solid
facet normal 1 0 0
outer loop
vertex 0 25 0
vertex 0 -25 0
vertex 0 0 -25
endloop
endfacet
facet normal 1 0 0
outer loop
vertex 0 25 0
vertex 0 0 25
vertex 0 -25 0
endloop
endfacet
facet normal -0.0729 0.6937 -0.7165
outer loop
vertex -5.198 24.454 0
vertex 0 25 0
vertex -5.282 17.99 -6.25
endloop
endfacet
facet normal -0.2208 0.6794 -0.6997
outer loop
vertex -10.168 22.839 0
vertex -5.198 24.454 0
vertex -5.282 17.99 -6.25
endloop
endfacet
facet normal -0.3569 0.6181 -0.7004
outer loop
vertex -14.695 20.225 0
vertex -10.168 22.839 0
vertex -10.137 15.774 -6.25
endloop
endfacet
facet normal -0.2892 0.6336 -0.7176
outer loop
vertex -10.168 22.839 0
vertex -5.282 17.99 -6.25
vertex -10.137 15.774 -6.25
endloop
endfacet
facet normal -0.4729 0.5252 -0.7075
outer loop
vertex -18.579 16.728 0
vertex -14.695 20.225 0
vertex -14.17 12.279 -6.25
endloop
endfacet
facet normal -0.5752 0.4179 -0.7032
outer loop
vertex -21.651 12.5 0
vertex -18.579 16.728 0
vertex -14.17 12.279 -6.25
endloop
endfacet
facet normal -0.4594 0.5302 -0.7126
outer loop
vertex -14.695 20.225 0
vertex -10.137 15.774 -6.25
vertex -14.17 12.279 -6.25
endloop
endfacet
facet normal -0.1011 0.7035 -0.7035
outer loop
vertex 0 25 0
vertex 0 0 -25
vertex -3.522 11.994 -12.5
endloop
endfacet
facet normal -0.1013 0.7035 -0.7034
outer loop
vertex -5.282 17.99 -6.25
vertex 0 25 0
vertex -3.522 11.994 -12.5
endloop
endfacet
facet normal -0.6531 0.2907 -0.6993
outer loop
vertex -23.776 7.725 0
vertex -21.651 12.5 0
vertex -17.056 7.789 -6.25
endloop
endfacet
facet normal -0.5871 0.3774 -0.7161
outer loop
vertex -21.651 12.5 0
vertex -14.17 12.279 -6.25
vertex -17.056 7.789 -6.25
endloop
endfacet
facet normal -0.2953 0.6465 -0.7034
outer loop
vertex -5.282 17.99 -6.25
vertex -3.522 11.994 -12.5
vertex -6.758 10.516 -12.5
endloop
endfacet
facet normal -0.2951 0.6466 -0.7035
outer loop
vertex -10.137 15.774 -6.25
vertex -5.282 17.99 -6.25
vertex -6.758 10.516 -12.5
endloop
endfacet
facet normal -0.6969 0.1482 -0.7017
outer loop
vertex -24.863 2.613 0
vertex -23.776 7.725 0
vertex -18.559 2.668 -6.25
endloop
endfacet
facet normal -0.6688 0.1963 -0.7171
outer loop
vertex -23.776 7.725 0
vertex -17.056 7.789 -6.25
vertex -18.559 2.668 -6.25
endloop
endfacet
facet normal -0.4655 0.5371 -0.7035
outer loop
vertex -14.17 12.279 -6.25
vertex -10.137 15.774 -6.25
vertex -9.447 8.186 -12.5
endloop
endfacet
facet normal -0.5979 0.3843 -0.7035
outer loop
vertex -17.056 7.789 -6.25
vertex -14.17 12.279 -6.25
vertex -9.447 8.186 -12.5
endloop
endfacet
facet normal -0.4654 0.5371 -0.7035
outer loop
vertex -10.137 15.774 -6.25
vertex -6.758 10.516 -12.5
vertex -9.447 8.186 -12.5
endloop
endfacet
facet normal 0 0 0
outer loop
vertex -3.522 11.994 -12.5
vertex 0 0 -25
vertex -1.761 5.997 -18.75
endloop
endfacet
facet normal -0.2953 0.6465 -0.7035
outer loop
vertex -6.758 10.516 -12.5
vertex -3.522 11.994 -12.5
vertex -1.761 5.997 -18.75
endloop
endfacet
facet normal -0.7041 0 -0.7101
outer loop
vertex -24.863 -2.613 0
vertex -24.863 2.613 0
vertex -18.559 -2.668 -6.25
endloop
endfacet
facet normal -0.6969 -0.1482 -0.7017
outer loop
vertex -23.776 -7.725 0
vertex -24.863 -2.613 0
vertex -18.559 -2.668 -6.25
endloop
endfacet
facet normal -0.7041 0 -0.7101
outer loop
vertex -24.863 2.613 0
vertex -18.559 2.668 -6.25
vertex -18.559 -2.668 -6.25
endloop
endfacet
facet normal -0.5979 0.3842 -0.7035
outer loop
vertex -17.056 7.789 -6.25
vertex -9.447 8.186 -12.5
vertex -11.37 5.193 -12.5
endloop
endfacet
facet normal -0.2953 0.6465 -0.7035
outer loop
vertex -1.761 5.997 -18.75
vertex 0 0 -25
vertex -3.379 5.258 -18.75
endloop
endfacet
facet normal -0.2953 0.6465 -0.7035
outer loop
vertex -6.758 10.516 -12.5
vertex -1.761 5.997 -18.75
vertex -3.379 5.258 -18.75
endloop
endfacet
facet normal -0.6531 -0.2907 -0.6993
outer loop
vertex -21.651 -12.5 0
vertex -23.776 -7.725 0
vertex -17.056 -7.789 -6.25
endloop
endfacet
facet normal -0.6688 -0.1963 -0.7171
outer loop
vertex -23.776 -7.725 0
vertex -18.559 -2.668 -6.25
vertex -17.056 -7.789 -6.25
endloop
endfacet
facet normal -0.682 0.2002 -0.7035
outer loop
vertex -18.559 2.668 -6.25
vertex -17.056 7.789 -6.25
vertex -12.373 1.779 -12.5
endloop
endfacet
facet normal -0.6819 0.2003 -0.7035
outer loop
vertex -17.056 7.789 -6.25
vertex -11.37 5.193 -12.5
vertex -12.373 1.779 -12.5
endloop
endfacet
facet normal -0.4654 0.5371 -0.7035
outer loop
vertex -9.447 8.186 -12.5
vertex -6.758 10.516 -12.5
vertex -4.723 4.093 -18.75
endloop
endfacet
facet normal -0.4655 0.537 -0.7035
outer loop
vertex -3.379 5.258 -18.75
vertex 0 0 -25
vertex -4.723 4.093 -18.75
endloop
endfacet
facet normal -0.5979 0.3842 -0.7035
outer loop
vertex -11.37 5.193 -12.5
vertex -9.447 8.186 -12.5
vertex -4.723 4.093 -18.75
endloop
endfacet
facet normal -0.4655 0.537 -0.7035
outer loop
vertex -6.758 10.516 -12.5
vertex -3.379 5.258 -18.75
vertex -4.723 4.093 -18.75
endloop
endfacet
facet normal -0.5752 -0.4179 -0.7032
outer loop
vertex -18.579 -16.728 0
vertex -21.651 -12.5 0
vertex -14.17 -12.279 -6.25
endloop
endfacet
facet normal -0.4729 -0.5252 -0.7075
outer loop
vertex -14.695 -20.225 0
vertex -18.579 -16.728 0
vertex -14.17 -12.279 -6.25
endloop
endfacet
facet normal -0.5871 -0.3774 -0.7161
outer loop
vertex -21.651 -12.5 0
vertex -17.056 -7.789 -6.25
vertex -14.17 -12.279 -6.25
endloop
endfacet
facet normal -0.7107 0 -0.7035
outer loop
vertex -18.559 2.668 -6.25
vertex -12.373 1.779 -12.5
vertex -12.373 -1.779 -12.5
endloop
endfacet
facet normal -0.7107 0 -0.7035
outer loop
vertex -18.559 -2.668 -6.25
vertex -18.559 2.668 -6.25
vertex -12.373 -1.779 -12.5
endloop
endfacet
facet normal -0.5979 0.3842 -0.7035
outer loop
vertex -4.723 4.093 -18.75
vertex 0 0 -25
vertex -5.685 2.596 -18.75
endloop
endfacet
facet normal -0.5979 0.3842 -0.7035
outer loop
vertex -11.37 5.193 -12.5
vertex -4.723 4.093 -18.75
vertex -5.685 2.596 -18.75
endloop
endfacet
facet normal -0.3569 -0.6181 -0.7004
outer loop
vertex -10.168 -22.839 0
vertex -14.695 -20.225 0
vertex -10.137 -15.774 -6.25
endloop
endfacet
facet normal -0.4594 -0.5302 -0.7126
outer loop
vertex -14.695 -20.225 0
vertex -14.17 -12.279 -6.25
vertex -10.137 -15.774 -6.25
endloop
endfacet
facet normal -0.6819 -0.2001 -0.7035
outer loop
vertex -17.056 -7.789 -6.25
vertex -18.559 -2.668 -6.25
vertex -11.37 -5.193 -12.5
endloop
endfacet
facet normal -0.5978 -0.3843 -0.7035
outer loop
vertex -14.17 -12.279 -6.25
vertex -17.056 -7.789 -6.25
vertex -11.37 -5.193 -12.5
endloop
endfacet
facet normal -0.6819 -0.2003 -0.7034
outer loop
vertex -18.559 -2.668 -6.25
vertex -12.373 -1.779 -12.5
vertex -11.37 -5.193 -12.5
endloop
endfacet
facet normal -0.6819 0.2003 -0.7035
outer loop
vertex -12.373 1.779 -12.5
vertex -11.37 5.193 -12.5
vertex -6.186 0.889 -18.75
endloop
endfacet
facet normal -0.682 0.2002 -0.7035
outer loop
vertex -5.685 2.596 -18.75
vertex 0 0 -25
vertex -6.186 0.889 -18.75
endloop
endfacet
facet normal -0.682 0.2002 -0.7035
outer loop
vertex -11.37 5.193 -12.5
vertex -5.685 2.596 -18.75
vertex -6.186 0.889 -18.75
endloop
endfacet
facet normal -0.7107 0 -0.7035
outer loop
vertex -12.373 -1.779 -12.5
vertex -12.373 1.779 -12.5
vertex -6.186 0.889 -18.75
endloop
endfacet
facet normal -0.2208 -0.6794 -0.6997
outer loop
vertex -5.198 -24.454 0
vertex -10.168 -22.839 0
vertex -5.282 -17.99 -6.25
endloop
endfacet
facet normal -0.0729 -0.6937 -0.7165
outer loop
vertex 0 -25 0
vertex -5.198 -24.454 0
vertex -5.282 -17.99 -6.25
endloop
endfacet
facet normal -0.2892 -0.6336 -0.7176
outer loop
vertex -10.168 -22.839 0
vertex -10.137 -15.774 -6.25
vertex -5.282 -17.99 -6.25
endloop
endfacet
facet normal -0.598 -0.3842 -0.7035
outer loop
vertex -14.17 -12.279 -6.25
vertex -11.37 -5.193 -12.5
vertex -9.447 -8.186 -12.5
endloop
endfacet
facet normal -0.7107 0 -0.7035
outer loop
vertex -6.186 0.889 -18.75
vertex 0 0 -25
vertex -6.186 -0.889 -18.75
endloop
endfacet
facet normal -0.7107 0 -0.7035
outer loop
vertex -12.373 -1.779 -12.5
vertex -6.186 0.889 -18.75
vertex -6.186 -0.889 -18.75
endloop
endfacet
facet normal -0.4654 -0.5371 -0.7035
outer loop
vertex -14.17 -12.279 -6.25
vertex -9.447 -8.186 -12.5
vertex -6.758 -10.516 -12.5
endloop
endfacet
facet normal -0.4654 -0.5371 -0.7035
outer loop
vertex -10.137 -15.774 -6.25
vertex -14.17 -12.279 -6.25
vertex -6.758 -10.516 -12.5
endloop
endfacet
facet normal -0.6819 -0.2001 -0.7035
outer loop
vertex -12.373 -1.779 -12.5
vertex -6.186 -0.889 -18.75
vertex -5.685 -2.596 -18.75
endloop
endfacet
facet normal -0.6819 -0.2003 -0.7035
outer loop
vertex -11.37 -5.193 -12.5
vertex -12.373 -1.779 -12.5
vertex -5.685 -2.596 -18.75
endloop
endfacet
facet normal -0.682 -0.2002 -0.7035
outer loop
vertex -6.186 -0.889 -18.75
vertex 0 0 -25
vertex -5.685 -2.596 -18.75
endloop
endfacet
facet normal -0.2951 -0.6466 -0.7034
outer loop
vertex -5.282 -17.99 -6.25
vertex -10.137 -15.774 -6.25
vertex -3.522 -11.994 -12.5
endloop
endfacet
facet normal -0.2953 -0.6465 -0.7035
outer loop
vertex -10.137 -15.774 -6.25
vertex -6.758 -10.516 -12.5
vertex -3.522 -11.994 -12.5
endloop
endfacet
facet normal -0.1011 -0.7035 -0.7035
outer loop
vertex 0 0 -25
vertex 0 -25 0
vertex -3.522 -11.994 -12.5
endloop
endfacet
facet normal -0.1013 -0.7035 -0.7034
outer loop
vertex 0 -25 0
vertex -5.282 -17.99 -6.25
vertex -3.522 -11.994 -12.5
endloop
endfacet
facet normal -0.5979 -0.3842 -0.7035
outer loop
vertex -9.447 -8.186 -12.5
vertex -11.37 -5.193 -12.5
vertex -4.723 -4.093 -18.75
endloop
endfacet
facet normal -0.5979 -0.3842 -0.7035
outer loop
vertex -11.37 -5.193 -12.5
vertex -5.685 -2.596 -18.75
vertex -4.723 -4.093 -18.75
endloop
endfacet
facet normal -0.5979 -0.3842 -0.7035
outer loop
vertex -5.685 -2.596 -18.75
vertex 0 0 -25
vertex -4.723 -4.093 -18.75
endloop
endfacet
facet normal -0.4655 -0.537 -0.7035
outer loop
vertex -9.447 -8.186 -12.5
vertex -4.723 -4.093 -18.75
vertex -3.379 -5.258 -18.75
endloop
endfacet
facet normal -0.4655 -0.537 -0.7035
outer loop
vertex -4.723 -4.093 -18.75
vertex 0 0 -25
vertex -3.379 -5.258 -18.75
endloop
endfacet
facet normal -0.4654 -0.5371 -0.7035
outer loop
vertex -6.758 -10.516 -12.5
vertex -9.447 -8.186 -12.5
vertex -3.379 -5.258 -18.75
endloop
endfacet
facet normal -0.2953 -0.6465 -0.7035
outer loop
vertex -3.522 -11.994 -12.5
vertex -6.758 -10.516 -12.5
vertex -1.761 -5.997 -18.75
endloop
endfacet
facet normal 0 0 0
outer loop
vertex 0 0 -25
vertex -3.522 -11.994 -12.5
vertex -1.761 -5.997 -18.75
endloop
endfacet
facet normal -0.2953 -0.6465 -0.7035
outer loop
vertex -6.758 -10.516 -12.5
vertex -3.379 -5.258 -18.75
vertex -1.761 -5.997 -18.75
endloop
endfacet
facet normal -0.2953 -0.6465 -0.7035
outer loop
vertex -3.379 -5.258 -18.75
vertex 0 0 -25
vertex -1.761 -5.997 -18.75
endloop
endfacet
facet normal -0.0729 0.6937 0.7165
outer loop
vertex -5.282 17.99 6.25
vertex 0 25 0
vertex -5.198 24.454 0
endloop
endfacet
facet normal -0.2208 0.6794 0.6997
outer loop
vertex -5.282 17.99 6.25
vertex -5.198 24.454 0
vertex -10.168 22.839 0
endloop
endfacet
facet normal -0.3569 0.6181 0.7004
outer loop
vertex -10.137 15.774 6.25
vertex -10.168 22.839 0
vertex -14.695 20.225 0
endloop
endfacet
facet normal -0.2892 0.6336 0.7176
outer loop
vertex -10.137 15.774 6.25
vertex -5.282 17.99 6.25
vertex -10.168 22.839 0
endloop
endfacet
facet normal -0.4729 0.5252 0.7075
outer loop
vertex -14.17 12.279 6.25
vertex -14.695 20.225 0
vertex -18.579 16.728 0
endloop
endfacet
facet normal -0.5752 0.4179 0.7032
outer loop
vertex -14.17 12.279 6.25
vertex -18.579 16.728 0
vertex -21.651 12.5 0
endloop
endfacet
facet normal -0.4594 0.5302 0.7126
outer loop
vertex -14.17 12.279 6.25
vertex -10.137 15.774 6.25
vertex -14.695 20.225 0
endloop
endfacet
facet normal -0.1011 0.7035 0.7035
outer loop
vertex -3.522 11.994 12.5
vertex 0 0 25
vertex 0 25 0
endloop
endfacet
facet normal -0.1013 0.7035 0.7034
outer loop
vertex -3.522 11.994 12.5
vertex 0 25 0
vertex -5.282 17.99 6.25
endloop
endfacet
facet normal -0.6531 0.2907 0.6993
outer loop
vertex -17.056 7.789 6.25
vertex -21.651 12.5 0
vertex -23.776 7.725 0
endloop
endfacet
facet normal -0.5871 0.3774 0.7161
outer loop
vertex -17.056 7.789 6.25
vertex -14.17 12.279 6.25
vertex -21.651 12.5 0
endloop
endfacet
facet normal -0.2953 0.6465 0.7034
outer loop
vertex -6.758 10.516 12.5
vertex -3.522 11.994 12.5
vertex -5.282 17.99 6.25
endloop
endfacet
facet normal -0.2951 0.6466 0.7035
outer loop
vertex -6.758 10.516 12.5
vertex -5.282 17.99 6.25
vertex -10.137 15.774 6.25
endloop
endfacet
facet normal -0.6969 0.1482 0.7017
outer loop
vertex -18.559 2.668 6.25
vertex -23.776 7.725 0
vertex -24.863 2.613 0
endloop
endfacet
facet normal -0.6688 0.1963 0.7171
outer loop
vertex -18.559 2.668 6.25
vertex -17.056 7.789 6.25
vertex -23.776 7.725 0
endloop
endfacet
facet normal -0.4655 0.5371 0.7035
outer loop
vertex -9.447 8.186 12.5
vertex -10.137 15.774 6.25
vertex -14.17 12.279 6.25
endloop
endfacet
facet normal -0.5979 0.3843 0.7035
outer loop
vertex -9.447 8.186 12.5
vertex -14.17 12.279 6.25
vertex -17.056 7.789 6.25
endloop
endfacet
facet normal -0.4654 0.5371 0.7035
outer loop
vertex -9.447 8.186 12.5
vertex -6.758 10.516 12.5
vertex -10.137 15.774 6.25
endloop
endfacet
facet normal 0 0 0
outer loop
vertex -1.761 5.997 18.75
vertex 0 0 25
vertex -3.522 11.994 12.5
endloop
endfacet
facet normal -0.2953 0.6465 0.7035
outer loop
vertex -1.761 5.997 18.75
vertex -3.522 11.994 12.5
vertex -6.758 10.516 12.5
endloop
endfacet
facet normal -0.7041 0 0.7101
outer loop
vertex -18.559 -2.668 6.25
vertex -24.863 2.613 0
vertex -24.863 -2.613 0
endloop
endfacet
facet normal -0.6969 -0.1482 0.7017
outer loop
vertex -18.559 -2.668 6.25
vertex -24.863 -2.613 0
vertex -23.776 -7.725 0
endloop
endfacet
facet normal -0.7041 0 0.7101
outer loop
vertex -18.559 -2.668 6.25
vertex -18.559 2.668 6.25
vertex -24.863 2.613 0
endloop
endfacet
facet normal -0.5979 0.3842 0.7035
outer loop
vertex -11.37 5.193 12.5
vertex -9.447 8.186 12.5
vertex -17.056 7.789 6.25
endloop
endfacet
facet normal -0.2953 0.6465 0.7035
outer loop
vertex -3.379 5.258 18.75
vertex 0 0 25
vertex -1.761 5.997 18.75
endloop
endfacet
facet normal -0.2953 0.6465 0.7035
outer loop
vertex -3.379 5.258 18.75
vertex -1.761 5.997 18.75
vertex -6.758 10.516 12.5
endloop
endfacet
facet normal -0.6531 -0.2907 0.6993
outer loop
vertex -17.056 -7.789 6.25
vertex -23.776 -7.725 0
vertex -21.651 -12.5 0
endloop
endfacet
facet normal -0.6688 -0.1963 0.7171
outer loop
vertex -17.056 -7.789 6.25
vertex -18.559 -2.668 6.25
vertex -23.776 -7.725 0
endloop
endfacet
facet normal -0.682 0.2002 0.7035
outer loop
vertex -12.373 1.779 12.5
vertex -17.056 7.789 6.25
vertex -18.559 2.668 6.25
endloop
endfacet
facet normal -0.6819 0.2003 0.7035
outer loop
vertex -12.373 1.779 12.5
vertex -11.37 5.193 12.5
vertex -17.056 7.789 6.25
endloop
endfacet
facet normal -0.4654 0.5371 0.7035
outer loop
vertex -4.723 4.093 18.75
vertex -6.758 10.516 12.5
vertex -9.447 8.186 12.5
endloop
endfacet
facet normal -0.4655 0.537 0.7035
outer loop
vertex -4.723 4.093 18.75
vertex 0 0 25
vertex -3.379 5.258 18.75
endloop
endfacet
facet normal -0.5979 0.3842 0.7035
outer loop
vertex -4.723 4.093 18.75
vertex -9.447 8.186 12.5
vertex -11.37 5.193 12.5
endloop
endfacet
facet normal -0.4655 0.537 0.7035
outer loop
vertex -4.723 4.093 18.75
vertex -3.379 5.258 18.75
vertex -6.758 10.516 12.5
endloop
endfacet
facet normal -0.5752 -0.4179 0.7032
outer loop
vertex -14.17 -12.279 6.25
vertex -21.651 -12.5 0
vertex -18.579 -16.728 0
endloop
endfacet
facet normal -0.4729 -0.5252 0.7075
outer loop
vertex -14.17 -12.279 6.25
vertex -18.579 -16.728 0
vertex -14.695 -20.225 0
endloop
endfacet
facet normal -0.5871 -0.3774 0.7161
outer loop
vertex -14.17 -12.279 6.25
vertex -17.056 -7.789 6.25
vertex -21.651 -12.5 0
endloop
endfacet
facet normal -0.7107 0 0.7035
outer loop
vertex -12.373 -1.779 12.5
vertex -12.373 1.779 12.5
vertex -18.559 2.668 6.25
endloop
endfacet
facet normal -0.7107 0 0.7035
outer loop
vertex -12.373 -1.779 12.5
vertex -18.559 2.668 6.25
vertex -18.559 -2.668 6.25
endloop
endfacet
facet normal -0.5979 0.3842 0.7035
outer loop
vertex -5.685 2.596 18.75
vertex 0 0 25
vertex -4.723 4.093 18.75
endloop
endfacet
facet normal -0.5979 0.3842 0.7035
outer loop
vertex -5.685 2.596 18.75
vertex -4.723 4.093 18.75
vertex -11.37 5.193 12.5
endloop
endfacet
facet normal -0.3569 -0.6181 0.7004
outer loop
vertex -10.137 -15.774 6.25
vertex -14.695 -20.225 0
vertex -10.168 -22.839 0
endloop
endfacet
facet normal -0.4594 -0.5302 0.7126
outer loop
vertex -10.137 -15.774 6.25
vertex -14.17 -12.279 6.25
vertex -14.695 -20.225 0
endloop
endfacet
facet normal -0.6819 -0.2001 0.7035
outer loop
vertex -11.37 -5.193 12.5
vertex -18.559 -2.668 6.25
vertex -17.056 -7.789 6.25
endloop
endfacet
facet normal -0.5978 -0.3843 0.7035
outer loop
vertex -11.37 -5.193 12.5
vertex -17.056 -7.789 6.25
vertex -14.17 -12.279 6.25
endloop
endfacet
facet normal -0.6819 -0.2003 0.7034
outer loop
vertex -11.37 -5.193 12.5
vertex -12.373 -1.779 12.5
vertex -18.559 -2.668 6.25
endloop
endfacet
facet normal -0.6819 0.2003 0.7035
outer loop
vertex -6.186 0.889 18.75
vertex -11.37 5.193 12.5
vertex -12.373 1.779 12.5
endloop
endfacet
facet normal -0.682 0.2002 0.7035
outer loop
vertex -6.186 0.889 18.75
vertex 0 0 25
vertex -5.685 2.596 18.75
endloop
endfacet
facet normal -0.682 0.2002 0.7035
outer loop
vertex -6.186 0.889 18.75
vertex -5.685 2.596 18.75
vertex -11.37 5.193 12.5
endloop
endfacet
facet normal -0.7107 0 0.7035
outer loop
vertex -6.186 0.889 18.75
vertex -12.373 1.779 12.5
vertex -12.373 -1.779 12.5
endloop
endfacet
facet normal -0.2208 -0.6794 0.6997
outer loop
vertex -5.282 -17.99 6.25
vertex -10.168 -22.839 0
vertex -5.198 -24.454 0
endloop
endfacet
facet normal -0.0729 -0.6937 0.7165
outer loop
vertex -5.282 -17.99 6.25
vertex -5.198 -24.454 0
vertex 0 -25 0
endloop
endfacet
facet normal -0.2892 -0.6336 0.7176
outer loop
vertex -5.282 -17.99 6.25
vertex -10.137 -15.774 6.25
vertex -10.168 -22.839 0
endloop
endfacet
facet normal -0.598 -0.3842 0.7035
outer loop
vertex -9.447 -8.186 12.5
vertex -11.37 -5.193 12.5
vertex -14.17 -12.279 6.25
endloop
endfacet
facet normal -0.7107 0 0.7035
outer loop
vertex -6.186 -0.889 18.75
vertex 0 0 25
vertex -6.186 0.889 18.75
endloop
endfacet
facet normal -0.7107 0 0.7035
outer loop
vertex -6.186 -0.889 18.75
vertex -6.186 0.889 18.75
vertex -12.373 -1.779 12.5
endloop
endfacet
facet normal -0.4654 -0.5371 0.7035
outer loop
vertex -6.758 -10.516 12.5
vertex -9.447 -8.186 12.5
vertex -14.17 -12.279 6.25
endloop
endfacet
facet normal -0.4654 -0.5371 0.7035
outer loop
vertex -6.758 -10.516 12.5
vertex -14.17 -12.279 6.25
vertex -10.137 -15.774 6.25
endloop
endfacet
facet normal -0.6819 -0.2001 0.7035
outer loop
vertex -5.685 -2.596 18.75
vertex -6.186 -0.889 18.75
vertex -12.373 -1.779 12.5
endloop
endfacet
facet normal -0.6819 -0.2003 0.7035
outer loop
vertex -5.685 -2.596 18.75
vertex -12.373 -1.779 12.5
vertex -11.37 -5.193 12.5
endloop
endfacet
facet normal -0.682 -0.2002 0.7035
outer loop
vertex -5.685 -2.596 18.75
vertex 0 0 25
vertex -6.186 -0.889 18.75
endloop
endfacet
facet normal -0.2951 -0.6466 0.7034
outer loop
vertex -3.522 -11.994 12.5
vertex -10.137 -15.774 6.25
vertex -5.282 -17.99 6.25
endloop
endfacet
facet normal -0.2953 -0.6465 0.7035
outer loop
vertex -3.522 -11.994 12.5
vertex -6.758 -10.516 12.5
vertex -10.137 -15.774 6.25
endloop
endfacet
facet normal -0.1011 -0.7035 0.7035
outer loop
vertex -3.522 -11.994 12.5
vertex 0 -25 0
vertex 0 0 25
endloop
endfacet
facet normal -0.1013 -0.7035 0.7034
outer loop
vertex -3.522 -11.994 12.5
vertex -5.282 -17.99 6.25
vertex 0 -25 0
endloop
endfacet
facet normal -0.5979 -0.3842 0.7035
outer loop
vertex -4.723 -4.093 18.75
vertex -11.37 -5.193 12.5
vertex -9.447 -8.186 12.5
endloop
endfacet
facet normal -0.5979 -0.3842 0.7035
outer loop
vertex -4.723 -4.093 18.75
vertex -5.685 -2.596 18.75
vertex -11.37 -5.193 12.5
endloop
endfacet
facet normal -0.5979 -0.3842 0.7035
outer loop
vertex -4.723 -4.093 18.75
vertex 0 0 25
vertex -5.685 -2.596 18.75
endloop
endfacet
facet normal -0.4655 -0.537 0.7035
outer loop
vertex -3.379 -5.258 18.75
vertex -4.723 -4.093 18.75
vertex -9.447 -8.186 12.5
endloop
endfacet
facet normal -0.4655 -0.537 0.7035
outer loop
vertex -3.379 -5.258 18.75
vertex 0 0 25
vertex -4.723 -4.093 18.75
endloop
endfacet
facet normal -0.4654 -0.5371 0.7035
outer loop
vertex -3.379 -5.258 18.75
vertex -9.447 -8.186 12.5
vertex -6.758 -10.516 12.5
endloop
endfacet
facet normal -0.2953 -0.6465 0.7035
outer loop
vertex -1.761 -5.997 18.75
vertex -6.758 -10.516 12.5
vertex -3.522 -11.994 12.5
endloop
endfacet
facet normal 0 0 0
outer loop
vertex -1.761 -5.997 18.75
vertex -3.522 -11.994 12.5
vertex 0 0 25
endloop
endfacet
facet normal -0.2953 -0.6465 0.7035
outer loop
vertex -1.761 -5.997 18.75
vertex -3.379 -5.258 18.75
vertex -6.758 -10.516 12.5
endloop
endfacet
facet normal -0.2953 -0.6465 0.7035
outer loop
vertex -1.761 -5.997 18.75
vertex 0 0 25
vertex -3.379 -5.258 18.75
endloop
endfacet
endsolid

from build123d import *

# Parameters (mm, degrees)
F0_R     = 25
F1_DEPTH = 25
F2_SIZE2 = 24.99999
F2_SIZE  = 24.99999
F3_W     = 55
F3_H     = 55
F4_DEPTH = 30


# Not quite as in the source:
# - a fillet or chamfer is up to 0.001 mm smaller than in the source, because OpenCascade refuses the exact size


with BuildPart() as f1:
    # F0 (on Top) → F1 (new body, symmetric)
    with BuildSketch(Plane.XY):
        Circle(F0_R)
    extrude(amount=F1_DEPTH, both=True)

    # F2 (size 25 and 25 in the source; OpenCascade refuses exactly that, so slightly less here)
    f2_edges = [f1.edges().sort_by_distance(p)[0] for p in [
        (-25, 0, 25),
        (-25, 0, -25),
    ]]
    chamfer(f2_edges, length=F2_SIZE, length2=F2_SIZE2)

    # F3 (on Right) → F4 (cut)
    with BuildSketch(Plane.YZ):
        Rectangle(F3_W, F3_H)
    extrude(amount=F4_DEPTH, mode=Mode.SUBTRACT)


solid = f1.part
